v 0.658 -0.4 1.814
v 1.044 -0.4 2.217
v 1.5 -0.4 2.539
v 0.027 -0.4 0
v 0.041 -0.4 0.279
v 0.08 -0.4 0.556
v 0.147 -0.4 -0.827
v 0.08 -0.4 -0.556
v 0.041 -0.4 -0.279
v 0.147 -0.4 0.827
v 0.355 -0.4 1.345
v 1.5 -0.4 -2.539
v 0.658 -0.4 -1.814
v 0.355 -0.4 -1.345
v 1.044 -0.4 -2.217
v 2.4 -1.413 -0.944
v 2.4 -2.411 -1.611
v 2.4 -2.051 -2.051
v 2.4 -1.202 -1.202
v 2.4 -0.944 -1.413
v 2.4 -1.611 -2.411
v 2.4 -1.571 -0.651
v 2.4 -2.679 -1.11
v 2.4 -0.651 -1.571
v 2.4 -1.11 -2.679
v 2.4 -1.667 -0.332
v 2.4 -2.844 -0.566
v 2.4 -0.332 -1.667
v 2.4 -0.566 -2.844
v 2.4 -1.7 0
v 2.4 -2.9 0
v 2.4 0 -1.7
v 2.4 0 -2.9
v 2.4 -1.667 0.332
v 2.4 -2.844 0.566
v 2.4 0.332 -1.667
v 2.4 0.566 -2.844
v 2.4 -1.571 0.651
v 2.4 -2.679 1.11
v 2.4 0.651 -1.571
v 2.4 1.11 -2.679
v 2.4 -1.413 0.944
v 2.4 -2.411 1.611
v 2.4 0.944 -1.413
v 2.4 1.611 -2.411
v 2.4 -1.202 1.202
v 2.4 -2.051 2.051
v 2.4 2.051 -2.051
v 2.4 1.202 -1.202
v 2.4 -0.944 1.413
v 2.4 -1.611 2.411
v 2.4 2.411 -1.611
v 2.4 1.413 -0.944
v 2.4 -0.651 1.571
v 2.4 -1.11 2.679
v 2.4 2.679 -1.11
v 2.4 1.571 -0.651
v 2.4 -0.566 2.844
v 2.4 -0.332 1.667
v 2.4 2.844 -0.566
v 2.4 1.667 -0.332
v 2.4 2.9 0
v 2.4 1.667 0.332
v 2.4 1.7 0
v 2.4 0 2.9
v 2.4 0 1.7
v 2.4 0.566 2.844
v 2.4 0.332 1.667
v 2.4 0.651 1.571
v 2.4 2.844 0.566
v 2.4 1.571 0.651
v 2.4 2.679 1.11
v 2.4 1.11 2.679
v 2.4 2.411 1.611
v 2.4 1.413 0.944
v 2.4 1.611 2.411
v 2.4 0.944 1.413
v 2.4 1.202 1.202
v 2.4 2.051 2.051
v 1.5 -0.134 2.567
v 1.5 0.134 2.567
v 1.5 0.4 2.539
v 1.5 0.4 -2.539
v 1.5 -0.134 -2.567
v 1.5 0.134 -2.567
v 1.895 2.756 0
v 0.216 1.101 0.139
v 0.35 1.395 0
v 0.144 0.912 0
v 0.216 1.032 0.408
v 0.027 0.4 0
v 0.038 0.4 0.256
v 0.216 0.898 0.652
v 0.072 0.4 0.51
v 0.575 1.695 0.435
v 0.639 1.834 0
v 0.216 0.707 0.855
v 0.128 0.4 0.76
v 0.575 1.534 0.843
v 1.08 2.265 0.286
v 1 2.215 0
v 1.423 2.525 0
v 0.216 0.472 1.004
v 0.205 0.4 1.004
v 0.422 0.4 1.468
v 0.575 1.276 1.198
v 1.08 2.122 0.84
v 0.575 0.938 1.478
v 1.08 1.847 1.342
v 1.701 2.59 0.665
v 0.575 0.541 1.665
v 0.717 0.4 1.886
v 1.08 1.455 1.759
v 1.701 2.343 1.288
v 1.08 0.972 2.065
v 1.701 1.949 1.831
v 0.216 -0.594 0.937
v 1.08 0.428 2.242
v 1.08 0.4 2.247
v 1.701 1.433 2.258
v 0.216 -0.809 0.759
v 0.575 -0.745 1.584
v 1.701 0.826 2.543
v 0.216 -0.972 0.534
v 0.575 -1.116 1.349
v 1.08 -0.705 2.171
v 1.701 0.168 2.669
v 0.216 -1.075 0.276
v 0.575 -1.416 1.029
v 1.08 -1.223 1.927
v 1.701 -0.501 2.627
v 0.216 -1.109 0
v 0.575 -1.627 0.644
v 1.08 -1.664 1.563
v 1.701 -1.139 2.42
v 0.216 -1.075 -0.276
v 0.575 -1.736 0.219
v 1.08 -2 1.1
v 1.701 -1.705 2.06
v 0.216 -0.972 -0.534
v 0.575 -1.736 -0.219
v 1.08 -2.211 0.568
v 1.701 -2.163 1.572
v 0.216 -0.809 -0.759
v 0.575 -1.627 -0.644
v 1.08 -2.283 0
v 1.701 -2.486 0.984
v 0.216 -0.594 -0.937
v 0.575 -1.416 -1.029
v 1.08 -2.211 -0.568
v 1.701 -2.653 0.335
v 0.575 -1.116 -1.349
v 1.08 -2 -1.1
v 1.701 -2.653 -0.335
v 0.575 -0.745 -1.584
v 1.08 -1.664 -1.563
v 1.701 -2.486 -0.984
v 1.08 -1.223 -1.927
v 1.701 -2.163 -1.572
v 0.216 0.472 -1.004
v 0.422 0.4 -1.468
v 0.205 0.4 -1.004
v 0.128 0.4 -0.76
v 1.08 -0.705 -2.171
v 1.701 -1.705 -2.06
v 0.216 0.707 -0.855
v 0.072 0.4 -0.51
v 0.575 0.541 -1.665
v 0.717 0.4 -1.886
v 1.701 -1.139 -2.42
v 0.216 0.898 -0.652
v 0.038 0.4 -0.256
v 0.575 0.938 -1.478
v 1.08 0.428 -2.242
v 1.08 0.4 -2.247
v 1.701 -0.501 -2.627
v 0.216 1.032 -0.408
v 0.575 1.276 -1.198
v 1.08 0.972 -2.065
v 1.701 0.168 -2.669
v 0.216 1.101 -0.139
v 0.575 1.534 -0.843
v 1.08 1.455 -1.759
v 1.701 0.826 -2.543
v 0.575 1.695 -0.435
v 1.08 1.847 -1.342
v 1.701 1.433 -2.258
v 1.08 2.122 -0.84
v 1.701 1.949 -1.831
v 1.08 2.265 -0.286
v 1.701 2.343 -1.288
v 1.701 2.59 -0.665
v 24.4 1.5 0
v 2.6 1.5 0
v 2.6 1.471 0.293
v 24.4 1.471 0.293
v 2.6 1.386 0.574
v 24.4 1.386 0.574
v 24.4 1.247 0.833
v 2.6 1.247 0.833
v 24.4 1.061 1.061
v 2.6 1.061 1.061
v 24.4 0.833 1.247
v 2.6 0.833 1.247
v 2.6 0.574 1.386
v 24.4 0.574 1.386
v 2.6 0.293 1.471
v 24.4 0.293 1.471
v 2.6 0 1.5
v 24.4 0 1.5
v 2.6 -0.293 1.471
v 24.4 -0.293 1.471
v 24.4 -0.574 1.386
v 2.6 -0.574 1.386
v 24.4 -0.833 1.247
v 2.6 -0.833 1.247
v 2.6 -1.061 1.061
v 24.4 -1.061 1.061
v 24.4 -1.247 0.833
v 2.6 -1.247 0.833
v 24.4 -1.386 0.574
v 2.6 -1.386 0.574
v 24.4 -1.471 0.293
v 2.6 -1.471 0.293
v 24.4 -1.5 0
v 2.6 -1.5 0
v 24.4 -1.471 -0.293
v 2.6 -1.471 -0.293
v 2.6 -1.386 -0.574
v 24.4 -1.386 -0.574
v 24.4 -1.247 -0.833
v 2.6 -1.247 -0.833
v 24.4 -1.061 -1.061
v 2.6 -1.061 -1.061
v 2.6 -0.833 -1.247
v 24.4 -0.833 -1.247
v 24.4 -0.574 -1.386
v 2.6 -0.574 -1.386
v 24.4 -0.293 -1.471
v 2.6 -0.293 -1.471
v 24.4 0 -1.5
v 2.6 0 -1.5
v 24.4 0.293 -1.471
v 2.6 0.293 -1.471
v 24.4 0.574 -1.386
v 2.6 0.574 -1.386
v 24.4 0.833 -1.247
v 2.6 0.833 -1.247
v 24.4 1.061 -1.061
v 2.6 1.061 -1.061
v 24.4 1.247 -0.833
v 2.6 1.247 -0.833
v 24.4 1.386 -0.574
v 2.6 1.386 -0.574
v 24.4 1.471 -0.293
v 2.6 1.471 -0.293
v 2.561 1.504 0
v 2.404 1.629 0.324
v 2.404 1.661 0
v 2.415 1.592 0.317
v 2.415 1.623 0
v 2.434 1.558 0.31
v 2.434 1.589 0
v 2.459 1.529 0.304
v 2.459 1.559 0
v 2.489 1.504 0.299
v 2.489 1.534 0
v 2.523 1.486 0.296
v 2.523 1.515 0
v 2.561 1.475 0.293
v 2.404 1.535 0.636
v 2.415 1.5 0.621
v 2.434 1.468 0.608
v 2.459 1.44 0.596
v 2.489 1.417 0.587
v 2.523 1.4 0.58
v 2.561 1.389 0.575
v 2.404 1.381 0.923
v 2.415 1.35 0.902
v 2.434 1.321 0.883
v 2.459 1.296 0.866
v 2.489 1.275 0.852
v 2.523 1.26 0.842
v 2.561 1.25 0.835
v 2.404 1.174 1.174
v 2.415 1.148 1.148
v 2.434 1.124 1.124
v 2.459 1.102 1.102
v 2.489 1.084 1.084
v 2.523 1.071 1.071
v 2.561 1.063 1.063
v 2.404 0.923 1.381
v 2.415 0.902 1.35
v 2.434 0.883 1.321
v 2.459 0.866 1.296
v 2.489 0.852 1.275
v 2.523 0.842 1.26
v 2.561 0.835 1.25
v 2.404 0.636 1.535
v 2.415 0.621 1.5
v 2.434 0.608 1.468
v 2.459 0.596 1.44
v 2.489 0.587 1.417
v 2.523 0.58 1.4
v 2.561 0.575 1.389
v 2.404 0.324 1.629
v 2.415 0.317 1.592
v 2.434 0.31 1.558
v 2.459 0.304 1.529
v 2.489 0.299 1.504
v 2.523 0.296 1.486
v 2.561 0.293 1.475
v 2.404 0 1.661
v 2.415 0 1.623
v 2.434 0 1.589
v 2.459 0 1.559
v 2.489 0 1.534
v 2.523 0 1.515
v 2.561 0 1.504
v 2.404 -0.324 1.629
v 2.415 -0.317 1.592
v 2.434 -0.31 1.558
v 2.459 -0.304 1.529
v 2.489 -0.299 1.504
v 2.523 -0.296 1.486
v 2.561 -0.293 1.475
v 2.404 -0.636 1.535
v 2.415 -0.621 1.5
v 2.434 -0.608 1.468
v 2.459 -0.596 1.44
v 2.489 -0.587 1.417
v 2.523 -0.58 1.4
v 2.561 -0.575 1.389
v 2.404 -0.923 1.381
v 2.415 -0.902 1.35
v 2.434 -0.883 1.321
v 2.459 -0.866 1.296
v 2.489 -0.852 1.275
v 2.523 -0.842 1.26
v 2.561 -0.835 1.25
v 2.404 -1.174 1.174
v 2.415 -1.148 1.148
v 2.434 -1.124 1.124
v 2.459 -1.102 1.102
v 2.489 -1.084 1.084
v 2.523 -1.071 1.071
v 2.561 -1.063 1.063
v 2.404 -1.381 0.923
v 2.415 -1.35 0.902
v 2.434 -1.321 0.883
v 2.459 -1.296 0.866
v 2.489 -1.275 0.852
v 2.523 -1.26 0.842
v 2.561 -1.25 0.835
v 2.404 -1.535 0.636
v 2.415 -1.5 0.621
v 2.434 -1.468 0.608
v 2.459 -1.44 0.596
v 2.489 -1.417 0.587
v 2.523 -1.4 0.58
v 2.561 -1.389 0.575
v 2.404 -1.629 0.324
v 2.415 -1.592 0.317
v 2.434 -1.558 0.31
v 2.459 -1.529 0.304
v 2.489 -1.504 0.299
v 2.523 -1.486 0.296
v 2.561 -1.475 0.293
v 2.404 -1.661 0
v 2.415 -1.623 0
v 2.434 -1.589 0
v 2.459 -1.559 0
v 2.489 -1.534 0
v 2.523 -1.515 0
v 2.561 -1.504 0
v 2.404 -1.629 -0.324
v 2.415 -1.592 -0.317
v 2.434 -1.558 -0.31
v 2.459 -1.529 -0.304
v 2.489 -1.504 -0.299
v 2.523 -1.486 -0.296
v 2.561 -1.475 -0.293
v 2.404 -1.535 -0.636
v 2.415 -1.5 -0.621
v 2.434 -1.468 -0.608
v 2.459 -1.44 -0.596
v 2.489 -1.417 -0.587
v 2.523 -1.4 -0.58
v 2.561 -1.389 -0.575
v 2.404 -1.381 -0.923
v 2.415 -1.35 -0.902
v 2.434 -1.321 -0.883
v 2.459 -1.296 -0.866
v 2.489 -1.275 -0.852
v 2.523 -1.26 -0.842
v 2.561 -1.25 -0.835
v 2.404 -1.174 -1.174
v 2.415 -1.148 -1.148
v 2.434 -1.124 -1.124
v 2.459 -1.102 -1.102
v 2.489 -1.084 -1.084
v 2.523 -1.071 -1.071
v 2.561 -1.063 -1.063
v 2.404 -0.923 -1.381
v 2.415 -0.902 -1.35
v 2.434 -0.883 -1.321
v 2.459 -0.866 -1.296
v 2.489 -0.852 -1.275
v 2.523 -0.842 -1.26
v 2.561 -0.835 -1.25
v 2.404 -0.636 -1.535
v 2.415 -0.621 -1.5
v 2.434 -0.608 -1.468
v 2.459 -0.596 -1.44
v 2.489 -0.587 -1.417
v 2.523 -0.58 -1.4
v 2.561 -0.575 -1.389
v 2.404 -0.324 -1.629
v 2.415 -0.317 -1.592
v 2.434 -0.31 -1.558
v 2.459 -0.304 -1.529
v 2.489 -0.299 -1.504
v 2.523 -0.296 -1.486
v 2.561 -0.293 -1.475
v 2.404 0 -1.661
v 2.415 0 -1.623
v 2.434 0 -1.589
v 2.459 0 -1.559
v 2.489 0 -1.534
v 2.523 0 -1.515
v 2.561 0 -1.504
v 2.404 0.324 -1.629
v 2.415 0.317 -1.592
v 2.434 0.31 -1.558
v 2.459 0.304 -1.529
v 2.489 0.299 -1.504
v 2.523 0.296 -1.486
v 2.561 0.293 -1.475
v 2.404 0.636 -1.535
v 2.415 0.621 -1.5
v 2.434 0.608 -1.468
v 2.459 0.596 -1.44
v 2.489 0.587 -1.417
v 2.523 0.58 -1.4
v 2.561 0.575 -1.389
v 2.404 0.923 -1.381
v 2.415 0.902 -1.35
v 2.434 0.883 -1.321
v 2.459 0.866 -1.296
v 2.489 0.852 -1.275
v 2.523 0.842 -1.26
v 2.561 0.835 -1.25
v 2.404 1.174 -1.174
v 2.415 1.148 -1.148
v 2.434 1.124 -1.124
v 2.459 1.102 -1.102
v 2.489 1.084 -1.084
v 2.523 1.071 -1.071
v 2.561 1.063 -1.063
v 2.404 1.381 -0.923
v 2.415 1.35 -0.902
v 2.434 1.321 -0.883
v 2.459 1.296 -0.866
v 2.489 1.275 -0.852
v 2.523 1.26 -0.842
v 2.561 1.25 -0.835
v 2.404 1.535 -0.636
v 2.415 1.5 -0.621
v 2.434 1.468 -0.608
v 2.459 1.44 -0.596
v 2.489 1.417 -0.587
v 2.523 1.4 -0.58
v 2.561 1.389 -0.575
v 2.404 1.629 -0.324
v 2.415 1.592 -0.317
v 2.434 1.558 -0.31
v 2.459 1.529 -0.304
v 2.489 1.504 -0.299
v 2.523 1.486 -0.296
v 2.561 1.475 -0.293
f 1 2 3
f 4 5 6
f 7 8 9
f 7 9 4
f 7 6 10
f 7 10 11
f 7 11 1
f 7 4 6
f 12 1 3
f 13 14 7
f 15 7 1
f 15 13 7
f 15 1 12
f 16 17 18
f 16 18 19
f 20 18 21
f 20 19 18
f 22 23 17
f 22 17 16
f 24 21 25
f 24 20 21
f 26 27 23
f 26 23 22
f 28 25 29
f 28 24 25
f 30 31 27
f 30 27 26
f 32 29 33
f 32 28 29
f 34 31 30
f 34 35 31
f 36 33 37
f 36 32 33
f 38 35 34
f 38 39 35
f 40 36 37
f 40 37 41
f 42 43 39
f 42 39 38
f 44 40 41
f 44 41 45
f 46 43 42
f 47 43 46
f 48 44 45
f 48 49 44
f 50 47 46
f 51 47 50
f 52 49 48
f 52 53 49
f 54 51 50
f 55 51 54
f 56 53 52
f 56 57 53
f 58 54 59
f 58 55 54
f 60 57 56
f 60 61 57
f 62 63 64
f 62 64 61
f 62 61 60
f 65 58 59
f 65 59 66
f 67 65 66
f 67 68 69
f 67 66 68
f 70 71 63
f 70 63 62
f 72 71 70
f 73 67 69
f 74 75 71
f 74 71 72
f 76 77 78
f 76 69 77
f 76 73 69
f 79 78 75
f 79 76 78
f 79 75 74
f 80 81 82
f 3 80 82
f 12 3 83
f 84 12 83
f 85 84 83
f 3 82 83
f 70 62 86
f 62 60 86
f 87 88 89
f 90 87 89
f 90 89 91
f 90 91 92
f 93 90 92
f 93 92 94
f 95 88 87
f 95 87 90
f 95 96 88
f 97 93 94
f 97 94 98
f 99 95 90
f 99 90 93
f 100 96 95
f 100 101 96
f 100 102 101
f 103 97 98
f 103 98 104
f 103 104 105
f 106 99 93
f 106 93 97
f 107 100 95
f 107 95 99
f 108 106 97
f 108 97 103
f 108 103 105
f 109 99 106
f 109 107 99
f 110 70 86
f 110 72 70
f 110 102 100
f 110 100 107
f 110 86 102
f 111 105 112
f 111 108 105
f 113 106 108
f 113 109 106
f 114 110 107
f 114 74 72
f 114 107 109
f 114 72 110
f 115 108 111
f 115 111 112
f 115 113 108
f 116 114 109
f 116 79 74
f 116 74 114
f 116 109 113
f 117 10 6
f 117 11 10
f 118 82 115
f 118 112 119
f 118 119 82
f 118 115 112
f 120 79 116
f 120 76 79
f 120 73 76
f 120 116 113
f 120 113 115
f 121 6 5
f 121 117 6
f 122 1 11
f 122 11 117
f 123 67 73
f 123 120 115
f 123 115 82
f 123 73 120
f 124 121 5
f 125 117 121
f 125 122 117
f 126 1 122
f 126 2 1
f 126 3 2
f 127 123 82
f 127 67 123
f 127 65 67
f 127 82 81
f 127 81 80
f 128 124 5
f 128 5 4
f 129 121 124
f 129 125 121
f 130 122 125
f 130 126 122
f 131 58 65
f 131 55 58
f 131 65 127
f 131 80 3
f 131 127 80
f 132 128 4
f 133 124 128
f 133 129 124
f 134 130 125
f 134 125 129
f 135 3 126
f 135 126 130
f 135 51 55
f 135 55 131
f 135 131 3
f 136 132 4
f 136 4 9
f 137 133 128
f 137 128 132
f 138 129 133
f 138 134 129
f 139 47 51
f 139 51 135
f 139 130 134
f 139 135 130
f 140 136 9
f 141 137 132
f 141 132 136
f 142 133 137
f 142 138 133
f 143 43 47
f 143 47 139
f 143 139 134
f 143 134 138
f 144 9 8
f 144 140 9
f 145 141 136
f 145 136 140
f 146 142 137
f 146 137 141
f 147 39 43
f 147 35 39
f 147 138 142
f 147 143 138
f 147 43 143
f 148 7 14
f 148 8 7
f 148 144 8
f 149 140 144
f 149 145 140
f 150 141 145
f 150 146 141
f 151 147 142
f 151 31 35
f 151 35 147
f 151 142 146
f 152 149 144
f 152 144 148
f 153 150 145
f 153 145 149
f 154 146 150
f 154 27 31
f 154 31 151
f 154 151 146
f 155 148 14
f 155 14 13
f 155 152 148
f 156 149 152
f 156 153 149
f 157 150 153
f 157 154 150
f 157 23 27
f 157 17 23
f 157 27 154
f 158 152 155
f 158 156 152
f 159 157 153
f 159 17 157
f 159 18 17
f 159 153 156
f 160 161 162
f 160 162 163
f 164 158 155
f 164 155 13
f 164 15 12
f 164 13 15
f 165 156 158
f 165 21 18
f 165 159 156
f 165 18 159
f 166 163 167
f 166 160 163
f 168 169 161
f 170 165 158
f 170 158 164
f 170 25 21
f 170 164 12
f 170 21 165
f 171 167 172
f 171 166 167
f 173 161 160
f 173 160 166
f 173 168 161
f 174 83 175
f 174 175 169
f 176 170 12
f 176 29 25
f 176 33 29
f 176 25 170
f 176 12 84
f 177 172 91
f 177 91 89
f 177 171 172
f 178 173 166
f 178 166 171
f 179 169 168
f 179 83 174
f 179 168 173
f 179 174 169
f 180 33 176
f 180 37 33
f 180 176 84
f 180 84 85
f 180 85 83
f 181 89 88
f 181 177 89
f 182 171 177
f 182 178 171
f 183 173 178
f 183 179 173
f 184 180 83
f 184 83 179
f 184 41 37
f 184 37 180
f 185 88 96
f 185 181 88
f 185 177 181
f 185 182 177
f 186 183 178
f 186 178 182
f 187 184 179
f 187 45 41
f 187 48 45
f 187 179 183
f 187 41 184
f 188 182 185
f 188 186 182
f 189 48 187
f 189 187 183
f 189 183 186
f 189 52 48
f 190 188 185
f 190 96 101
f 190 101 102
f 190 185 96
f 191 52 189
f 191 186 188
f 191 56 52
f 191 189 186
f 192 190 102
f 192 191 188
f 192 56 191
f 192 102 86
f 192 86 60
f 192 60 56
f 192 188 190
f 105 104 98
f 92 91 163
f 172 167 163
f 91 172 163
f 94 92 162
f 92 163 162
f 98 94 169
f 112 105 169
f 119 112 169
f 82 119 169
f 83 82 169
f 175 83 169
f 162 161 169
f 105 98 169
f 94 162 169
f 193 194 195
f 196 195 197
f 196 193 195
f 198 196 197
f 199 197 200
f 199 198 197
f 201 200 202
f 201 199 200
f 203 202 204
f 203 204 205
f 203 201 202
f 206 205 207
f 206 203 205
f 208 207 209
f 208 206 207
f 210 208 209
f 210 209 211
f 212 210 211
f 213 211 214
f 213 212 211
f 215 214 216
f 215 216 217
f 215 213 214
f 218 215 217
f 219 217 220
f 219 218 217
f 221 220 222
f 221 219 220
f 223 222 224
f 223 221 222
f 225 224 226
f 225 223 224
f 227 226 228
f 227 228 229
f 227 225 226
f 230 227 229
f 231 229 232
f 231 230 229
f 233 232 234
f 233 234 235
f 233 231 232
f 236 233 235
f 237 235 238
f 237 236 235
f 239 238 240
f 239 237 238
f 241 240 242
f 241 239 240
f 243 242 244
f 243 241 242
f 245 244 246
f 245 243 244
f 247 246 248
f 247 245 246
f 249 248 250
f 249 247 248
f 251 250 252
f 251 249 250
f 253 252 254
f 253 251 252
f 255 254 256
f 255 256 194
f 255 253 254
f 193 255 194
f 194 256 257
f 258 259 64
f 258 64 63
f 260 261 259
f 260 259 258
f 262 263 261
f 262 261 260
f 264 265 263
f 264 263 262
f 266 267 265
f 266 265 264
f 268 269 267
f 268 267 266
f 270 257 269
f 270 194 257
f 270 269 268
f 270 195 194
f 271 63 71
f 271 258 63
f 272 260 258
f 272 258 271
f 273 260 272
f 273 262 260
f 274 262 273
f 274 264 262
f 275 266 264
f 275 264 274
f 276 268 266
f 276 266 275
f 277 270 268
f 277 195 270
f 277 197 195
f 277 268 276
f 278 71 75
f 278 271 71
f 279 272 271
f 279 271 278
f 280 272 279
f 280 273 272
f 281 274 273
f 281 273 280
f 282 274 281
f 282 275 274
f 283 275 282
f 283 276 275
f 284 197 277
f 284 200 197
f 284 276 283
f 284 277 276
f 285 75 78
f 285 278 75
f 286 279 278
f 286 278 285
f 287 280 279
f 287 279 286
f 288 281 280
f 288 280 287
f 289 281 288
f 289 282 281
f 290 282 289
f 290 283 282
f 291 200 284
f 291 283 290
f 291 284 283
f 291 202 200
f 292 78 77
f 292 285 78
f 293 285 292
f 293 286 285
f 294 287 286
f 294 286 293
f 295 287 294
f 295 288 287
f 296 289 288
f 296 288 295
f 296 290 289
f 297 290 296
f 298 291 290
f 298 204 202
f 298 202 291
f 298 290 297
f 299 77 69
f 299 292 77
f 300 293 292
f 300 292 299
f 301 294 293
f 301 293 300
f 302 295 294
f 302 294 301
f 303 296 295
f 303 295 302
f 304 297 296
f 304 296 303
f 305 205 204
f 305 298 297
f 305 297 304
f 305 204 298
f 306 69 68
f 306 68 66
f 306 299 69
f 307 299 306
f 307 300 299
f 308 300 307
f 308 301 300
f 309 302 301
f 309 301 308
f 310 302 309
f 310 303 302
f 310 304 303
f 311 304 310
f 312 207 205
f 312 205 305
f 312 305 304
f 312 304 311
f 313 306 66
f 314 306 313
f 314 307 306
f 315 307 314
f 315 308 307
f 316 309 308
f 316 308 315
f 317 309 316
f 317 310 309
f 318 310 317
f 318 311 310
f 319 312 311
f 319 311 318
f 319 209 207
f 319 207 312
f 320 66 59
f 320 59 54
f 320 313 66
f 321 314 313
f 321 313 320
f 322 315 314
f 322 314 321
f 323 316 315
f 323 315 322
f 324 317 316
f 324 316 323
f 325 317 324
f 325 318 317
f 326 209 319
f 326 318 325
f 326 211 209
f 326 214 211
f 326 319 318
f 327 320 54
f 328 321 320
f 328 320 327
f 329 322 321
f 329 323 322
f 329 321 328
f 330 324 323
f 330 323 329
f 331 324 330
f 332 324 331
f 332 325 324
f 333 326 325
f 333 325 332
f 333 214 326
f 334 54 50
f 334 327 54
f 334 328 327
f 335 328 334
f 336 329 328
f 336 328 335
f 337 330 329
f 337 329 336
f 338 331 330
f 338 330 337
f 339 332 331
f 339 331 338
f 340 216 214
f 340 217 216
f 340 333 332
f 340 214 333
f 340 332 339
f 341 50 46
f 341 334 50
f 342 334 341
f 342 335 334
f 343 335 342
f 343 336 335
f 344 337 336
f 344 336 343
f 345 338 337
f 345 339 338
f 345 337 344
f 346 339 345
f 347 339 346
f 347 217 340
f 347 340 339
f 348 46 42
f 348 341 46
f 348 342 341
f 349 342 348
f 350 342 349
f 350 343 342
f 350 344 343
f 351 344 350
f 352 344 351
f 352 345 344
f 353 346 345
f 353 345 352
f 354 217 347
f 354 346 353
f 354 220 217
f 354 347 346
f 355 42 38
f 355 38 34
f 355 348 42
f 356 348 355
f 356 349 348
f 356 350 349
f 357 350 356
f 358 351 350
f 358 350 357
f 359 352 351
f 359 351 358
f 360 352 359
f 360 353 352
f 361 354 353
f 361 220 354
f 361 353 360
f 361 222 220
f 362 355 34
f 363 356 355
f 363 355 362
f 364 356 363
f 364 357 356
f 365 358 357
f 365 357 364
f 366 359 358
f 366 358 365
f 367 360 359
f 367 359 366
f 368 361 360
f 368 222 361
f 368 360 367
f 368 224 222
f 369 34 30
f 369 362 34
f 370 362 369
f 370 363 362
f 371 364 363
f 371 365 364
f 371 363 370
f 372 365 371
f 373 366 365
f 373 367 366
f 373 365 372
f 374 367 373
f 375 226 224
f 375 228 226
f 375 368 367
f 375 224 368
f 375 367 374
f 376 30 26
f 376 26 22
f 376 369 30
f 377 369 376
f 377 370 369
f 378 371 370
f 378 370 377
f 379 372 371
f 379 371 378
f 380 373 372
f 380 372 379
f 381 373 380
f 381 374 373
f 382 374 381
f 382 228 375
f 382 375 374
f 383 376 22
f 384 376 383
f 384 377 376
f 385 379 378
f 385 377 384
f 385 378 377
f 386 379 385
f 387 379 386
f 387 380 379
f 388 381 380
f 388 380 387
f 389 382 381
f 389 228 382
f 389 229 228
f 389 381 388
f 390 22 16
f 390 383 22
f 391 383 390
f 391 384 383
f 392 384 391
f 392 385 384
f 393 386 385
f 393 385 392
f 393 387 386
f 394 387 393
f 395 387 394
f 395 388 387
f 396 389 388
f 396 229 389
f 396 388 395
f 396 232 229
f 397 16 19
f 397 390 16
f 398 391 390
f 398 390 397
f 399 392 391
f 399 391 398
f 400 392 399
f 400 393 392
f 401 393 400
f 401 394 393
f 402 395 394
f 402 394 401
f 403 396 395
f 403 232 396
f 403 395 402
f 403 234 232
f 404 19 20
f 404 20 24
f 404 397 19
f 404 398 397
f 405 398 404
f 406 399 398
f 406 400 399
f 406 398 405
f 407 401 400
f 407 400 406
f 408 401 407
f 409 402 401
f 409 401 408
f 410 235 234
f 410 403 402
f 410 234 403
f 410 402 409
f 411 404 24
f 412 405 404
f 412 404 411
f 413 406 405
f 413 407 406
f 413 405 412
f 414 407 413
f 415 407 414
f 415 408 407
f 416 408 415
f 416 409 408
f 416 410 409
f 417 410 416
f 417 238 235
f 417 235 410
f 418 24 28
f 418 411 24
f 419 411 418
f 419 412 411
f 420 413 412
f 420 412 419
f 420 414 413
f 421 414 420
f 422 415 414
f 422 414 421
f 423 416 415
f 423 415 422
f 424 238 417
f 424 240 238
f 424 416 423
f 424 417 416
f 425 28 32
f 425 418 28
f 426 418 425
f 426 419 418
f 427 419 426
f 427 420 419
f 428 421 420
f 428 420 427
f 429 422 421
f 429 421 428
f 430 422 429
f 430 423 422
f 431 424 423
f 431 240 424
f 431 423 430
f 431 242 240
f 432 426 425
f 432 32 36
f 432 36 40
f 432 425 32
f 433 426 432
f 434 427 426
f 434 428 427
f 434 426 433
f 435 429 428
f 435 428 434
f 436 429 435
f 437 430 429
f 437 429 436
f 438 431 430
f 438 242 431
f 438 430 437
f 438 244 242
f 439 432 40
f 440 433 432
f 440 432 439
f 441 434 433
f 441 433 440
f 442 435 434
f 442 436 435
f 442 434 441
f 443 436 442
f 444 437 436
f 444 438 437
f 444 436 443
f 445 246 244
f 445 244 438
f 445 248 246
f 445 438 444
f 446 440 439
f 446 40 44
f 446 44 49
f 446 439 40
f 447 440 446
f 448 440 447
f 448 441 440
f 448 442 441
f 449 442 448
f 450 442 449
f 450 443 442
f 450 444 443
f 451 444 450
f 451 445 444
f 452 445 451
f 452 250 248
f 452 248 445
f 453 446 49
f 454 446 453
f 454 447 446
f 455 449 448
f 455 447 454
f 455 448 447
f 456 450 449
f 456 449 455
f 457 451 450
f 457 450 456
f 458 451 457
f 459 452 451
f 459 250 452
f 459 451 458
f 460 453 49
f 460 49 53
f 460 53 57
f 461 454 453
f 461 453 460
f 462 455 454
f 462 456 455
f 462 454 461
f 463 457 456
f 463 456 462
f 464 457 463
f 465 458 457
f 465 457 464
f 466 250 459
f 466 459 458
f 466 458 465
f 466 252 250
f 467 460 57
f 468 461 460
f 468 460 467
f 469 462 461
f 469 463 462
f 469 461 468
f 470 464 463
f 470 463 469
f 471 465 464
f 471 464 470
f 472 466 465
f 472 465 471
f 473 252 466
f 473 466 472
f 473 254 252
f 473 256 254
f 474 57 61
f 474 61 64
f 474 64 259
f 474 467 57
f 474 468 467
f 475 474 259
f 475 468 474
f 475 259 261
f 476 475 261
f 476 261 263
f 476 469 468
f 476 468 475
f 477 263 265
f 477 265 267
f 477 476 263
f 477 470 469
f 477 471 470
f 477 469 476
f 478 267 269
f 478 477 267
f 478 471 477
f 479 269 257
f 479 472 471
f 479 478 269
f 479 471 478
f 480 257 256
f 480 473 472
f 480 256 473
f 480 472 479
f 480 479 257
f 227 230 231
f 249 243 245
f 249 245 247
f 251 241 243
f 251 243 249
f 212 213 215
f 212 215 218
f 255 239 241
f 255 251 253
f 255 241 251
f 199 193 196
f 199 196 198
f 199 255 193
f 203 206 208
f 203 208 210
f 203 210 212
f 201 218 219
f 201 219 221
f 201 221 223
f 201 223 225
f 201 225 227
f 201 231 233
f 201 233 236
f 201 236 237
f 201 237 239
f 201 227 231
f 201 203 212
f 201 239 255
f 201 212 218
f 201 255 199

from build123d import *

# Parameters (mm, degrees)
SKETCH_2_W          = 5.8
SKETCH_2_H          = 0.8
CUT_EXTRUDE_1_DEPTH = 1.5
FILLET_1_R          = 0.2


with BuildPart() as part:
    # 草图1 → 旋转1 (revolve)
    with BuildSketch(Plane.XY):
        with BuildLine():
            Line((2.4, 2.9), (2.4, 1.5))
            Line((2.4, 1.5), (10.4, 1.5))
            Line((10.4, 1.5), (24.4, 1.5))
            Line((24.4, 1.5), (24.4, 0))
            Line((24.4, 0), (0, 0))
            ThreePointArc((0, 0), (0.677815098, 1.882153022), (2.4, 2.9))
        make_face()
    revolve(axis=Axis((0, 0, 0), (1, 0, 0)))

    # 草图2 → 切除-拉伸1 (cut)
    with BuildSketch(Plane(origin=(0, 0, 0), x_dir=(0, 0, -1), z_dir=(1, 0, 0))):
        Rectangle(SKETCH_2_W, SKETCH_2_H)
    extrude(amount=CUT_EXTRUDE_1_DEPTH, mode=Mode.SUBTRACT)

    # 圆角1
    fillet_1_edges = [part.edges().sort_by_distance(p)[0] for p in [
        (2.4, -1.5, 0),
    ]]
    fillet(fillet_1_edges, radius=FILLET_1_R)


solid = part.part
